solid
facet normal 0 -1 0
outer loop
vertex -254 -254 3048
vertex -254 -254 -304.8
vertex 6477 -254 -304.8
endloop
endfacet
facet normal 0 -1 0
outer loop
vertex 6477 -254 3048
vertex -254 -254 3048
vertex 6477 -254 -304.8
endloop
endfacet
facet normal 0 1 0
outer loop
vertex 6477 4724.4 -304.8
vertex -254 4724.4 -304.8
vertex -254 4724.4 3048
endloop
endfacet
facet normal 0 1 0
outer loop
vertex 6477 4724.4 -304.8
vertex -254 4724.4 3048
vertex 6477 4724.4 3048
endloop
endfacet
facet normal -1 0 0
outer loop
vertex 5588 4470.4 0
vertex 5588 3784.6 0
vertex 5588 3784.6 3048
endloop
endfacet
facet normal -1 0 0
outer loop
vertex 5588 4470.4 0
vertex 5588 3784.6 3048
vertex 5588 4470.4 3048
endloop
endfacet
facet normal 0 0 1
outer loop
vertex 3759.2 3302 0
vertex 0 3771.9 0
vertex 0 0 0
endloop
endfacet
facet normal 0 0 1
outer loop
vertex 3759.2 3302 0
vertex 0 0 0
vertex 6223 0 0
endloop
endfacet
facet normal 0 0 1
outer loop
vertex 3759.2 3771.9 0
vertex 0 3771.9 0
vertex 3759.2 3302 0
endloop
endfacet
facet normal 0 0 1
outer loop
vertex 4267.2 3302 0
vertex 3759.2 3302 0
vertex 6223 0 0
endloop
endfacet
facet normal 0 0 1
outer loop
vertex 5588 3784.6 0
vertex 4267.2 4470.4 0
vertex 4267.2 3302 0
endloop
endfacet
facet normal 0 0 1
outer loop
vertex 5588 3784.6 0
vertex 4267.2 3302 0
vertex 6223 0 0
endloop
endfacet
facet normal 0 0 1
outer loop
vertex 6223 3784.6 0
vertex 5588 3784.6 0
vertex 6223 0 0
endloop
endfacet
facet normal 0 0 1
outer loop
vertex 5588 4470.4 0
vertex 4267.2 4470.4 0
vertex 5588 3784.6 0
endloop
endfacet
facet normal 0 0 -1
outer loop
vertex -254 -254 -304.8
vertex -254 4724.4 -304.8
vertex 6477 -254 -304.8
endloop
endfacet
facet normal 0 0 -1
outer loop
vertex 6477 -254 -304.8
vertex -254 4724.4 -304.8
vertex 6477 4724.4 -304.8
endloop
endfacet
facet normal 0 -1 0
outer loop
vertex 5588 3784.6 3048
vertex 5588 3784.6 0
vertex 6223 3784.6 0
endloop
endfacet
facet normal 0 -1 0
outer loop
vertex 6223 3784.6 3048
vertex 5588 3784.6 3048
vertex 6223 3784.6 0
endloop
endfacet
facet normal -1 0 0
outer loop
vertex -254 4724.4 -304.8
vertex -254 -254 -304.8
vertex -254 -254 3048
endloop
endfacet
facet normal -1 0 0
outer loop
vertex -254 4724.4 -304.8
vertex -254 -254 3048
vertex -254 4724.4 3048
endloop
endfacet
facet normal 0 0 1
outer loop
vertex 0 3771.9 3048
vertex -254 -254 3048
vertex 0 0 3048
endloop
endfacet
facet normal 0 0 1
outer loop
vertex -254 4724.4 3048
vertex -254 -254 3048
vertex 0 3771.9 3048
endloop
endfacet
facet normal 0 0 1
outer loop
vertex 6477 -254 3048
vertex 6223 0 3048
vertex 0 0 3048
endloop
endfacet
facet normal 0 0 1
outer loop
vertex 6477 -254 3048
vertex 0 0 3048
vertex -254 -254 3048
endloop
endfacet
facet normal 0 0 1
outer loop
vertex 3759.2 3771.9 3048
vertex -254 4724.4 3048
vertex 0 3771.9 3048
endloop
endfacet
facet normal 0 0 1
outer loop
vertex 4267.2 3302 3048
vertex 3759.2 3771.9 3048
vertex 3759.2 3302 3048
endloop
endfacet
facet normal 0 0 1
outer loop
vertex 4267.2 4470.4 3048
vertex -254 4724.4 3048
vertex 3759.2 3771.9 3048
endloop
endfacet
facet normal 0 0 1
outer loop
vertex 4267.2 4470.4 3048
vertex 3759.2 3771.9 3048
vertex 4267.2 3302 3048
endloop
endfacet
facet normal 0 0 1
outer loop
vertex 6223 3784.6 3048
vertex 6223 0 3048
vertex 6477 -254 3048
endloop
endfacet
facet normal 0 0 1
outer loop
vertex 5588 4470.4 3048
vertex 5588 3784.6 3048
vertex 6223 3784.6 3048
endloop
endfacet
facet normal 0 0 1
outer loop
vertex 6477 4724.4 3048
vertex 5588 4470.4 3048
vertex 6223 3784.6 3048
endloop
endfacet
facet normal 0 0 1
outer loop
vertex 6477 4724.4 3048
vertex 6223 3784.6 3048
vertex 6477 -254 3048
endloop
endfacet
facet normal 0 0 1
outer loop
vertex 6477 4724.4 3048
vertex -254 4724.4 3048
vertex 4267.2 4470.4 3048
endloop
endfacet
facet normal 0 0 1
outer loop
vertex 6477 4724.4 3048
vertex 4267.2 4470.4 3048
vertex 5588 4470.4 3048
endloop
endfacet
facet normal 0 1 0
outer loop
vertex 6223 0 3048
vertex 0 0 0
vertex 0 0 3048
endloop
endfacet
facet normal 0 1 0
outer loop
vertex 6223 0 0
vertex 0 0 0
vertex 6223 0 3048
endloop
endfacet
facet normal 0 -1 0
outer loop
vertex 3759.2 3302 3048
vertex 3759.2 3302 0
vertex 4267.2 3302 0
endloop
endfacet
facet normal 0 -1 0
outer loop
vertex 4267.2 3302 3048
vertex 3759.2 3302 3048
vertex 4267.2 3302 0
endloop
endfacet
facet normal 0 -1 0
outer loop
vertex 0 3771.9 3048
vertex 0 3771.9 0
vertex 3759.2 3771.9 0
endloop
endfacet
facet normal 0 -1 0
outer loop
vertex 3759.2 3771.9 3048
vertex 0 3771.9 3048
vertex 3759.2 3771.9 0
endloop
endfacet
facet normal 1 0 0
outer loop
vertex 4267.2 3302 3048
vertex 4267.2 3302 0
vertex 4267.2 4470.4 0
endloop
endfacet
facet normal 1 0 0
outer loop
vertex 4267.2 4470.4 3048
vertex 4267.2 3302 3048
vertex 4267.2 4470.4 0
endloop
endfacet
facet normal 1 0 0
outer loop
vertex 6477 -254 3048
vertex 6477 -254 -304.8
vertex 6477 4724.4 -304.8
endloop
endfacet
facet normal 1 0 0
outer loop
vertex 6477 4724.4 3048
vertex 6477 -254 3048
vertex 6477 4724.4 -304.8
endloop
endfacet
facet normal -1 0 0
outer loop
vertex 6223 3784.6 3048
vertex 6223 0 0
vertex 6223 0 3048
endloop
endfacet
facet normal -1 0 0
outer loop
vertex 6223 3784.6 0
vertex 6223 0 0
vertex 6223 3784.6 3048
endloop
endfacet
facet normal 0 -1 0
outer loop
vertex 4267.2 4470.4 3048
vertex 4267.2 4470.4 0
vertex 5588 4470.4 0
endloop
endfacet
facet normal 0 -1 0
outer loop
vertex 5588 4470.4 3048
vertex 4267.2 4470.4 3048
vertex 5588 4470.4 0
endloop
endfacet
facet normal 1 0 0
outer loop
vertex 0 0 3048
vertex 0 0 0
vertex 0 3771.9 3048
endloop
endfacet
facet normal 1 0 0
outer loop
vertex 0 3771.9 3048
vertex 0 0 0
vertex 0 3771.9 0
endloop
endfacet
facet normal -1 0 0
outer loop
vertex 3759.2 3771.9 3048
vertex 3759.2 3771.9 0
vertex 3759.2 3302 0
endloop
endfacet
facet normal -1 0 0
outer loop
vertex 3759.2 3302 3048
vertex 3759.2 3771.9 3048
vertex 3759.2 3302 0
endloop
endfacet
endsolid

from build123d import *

# Parameters (mm, degrees)
EXTRUDE_THIN1_DEPTH      = 3048
EXTRUDE_THIN1_DEPTH_BACK = 304.8
SKETCH1_W                = 6731
SKETCH1_H                = 4978.4
SKETCH1_W_2              = 6223
SKETCH1_H_2              = 4470.4
SKETCH1_4_W              = 3759.2
SKETCH1_4_H              = 698.5
SKETCH1_4_W_2            = 635
SKETCH1_4_H_2            = 685.8
BOSS_EXTRUDE1_DEPTH      = 304.8
SKETCH1_5_W              = 3759.2
SKETCH1_5_H              = 698.5
SKETCH1_5_W_2            = 635
SKETCH1_5_H_2            = 685.8
BOSS_EXTRUDE2_DEPTH      = 3048


with BuildPart() as part:
    # Sketch1 → Extrude-Thin1 (new, two sides: drawn at the far end of the back side and taken through both)
    with BuildSketch(Plane.XY.offset(-EXTRUDE_THIN1_DEPTH_BACK)):
        with Locations((3111.5, 2235.2)):
            Rectangle(SKETCH1_W, SKETCH1_H)
        with Locations((3111.5, 2235.2)):
            Rectangle(SKETCH1_W_2, SKETCH1_H_2, mode=Mode.SUBTRACT)
    extrude(amount=EXTRUDE_THIN1_DEPTH + EXTRUDE_THIN1_DEPTH_BACK)

    # Sketch1<4> → Boss-Extrude1 (add)
    with BuildSketch(Plane.XY):
        Polygon((5588, 3784.6), (5588, 4470.4), (4267.2, 4470.4), (4267.2, 3302), (3759.2, 3302), (3759.2, 3771.9), (0, 3771.9), (0, 0), (6223, 0), (6223, 3784.6), align=None)
        with Locations((1879.6, 4121.15)):
            Rectangle(SKETCH1_4_W, SKETCH1_4_H)
        Polygon((4267.2, 3302), (4267.2, 4470.4), (3759.2, 4470.4), (3759.2, 3771.9), (3759.2, 3302), align=None)
        with Locations((5905.5, 4127.5)):
            Rectangle(SKETCH1_4_W_2, SKETCH1_4_H_2)
    extrude(amount=-BOSS_EXTRUDE1_DEPTH)

    # Sketch1<5> → Boss-Extrude2 (add)
    with BuildSketch(Plane.XY):
        with Locations((1879.6, 4121.15)):
            Rectangle(SKETCH1_5_W, SKETCH1_5_H)
        Polygon((4267.2, 3302), (4267.2, 4470.4), (3759.2, 4470.4), (3759.2, 3771.9), (3759.2, 3302), align=None)
        with Locations((5905.5, 4127.5)):
            Rectangle(SKETCH1_5_W_2, SKETCH1_5_H_2)
    extrude(amount=BOSS_EXTRUDE2_DEPTH)


solid = part.part
